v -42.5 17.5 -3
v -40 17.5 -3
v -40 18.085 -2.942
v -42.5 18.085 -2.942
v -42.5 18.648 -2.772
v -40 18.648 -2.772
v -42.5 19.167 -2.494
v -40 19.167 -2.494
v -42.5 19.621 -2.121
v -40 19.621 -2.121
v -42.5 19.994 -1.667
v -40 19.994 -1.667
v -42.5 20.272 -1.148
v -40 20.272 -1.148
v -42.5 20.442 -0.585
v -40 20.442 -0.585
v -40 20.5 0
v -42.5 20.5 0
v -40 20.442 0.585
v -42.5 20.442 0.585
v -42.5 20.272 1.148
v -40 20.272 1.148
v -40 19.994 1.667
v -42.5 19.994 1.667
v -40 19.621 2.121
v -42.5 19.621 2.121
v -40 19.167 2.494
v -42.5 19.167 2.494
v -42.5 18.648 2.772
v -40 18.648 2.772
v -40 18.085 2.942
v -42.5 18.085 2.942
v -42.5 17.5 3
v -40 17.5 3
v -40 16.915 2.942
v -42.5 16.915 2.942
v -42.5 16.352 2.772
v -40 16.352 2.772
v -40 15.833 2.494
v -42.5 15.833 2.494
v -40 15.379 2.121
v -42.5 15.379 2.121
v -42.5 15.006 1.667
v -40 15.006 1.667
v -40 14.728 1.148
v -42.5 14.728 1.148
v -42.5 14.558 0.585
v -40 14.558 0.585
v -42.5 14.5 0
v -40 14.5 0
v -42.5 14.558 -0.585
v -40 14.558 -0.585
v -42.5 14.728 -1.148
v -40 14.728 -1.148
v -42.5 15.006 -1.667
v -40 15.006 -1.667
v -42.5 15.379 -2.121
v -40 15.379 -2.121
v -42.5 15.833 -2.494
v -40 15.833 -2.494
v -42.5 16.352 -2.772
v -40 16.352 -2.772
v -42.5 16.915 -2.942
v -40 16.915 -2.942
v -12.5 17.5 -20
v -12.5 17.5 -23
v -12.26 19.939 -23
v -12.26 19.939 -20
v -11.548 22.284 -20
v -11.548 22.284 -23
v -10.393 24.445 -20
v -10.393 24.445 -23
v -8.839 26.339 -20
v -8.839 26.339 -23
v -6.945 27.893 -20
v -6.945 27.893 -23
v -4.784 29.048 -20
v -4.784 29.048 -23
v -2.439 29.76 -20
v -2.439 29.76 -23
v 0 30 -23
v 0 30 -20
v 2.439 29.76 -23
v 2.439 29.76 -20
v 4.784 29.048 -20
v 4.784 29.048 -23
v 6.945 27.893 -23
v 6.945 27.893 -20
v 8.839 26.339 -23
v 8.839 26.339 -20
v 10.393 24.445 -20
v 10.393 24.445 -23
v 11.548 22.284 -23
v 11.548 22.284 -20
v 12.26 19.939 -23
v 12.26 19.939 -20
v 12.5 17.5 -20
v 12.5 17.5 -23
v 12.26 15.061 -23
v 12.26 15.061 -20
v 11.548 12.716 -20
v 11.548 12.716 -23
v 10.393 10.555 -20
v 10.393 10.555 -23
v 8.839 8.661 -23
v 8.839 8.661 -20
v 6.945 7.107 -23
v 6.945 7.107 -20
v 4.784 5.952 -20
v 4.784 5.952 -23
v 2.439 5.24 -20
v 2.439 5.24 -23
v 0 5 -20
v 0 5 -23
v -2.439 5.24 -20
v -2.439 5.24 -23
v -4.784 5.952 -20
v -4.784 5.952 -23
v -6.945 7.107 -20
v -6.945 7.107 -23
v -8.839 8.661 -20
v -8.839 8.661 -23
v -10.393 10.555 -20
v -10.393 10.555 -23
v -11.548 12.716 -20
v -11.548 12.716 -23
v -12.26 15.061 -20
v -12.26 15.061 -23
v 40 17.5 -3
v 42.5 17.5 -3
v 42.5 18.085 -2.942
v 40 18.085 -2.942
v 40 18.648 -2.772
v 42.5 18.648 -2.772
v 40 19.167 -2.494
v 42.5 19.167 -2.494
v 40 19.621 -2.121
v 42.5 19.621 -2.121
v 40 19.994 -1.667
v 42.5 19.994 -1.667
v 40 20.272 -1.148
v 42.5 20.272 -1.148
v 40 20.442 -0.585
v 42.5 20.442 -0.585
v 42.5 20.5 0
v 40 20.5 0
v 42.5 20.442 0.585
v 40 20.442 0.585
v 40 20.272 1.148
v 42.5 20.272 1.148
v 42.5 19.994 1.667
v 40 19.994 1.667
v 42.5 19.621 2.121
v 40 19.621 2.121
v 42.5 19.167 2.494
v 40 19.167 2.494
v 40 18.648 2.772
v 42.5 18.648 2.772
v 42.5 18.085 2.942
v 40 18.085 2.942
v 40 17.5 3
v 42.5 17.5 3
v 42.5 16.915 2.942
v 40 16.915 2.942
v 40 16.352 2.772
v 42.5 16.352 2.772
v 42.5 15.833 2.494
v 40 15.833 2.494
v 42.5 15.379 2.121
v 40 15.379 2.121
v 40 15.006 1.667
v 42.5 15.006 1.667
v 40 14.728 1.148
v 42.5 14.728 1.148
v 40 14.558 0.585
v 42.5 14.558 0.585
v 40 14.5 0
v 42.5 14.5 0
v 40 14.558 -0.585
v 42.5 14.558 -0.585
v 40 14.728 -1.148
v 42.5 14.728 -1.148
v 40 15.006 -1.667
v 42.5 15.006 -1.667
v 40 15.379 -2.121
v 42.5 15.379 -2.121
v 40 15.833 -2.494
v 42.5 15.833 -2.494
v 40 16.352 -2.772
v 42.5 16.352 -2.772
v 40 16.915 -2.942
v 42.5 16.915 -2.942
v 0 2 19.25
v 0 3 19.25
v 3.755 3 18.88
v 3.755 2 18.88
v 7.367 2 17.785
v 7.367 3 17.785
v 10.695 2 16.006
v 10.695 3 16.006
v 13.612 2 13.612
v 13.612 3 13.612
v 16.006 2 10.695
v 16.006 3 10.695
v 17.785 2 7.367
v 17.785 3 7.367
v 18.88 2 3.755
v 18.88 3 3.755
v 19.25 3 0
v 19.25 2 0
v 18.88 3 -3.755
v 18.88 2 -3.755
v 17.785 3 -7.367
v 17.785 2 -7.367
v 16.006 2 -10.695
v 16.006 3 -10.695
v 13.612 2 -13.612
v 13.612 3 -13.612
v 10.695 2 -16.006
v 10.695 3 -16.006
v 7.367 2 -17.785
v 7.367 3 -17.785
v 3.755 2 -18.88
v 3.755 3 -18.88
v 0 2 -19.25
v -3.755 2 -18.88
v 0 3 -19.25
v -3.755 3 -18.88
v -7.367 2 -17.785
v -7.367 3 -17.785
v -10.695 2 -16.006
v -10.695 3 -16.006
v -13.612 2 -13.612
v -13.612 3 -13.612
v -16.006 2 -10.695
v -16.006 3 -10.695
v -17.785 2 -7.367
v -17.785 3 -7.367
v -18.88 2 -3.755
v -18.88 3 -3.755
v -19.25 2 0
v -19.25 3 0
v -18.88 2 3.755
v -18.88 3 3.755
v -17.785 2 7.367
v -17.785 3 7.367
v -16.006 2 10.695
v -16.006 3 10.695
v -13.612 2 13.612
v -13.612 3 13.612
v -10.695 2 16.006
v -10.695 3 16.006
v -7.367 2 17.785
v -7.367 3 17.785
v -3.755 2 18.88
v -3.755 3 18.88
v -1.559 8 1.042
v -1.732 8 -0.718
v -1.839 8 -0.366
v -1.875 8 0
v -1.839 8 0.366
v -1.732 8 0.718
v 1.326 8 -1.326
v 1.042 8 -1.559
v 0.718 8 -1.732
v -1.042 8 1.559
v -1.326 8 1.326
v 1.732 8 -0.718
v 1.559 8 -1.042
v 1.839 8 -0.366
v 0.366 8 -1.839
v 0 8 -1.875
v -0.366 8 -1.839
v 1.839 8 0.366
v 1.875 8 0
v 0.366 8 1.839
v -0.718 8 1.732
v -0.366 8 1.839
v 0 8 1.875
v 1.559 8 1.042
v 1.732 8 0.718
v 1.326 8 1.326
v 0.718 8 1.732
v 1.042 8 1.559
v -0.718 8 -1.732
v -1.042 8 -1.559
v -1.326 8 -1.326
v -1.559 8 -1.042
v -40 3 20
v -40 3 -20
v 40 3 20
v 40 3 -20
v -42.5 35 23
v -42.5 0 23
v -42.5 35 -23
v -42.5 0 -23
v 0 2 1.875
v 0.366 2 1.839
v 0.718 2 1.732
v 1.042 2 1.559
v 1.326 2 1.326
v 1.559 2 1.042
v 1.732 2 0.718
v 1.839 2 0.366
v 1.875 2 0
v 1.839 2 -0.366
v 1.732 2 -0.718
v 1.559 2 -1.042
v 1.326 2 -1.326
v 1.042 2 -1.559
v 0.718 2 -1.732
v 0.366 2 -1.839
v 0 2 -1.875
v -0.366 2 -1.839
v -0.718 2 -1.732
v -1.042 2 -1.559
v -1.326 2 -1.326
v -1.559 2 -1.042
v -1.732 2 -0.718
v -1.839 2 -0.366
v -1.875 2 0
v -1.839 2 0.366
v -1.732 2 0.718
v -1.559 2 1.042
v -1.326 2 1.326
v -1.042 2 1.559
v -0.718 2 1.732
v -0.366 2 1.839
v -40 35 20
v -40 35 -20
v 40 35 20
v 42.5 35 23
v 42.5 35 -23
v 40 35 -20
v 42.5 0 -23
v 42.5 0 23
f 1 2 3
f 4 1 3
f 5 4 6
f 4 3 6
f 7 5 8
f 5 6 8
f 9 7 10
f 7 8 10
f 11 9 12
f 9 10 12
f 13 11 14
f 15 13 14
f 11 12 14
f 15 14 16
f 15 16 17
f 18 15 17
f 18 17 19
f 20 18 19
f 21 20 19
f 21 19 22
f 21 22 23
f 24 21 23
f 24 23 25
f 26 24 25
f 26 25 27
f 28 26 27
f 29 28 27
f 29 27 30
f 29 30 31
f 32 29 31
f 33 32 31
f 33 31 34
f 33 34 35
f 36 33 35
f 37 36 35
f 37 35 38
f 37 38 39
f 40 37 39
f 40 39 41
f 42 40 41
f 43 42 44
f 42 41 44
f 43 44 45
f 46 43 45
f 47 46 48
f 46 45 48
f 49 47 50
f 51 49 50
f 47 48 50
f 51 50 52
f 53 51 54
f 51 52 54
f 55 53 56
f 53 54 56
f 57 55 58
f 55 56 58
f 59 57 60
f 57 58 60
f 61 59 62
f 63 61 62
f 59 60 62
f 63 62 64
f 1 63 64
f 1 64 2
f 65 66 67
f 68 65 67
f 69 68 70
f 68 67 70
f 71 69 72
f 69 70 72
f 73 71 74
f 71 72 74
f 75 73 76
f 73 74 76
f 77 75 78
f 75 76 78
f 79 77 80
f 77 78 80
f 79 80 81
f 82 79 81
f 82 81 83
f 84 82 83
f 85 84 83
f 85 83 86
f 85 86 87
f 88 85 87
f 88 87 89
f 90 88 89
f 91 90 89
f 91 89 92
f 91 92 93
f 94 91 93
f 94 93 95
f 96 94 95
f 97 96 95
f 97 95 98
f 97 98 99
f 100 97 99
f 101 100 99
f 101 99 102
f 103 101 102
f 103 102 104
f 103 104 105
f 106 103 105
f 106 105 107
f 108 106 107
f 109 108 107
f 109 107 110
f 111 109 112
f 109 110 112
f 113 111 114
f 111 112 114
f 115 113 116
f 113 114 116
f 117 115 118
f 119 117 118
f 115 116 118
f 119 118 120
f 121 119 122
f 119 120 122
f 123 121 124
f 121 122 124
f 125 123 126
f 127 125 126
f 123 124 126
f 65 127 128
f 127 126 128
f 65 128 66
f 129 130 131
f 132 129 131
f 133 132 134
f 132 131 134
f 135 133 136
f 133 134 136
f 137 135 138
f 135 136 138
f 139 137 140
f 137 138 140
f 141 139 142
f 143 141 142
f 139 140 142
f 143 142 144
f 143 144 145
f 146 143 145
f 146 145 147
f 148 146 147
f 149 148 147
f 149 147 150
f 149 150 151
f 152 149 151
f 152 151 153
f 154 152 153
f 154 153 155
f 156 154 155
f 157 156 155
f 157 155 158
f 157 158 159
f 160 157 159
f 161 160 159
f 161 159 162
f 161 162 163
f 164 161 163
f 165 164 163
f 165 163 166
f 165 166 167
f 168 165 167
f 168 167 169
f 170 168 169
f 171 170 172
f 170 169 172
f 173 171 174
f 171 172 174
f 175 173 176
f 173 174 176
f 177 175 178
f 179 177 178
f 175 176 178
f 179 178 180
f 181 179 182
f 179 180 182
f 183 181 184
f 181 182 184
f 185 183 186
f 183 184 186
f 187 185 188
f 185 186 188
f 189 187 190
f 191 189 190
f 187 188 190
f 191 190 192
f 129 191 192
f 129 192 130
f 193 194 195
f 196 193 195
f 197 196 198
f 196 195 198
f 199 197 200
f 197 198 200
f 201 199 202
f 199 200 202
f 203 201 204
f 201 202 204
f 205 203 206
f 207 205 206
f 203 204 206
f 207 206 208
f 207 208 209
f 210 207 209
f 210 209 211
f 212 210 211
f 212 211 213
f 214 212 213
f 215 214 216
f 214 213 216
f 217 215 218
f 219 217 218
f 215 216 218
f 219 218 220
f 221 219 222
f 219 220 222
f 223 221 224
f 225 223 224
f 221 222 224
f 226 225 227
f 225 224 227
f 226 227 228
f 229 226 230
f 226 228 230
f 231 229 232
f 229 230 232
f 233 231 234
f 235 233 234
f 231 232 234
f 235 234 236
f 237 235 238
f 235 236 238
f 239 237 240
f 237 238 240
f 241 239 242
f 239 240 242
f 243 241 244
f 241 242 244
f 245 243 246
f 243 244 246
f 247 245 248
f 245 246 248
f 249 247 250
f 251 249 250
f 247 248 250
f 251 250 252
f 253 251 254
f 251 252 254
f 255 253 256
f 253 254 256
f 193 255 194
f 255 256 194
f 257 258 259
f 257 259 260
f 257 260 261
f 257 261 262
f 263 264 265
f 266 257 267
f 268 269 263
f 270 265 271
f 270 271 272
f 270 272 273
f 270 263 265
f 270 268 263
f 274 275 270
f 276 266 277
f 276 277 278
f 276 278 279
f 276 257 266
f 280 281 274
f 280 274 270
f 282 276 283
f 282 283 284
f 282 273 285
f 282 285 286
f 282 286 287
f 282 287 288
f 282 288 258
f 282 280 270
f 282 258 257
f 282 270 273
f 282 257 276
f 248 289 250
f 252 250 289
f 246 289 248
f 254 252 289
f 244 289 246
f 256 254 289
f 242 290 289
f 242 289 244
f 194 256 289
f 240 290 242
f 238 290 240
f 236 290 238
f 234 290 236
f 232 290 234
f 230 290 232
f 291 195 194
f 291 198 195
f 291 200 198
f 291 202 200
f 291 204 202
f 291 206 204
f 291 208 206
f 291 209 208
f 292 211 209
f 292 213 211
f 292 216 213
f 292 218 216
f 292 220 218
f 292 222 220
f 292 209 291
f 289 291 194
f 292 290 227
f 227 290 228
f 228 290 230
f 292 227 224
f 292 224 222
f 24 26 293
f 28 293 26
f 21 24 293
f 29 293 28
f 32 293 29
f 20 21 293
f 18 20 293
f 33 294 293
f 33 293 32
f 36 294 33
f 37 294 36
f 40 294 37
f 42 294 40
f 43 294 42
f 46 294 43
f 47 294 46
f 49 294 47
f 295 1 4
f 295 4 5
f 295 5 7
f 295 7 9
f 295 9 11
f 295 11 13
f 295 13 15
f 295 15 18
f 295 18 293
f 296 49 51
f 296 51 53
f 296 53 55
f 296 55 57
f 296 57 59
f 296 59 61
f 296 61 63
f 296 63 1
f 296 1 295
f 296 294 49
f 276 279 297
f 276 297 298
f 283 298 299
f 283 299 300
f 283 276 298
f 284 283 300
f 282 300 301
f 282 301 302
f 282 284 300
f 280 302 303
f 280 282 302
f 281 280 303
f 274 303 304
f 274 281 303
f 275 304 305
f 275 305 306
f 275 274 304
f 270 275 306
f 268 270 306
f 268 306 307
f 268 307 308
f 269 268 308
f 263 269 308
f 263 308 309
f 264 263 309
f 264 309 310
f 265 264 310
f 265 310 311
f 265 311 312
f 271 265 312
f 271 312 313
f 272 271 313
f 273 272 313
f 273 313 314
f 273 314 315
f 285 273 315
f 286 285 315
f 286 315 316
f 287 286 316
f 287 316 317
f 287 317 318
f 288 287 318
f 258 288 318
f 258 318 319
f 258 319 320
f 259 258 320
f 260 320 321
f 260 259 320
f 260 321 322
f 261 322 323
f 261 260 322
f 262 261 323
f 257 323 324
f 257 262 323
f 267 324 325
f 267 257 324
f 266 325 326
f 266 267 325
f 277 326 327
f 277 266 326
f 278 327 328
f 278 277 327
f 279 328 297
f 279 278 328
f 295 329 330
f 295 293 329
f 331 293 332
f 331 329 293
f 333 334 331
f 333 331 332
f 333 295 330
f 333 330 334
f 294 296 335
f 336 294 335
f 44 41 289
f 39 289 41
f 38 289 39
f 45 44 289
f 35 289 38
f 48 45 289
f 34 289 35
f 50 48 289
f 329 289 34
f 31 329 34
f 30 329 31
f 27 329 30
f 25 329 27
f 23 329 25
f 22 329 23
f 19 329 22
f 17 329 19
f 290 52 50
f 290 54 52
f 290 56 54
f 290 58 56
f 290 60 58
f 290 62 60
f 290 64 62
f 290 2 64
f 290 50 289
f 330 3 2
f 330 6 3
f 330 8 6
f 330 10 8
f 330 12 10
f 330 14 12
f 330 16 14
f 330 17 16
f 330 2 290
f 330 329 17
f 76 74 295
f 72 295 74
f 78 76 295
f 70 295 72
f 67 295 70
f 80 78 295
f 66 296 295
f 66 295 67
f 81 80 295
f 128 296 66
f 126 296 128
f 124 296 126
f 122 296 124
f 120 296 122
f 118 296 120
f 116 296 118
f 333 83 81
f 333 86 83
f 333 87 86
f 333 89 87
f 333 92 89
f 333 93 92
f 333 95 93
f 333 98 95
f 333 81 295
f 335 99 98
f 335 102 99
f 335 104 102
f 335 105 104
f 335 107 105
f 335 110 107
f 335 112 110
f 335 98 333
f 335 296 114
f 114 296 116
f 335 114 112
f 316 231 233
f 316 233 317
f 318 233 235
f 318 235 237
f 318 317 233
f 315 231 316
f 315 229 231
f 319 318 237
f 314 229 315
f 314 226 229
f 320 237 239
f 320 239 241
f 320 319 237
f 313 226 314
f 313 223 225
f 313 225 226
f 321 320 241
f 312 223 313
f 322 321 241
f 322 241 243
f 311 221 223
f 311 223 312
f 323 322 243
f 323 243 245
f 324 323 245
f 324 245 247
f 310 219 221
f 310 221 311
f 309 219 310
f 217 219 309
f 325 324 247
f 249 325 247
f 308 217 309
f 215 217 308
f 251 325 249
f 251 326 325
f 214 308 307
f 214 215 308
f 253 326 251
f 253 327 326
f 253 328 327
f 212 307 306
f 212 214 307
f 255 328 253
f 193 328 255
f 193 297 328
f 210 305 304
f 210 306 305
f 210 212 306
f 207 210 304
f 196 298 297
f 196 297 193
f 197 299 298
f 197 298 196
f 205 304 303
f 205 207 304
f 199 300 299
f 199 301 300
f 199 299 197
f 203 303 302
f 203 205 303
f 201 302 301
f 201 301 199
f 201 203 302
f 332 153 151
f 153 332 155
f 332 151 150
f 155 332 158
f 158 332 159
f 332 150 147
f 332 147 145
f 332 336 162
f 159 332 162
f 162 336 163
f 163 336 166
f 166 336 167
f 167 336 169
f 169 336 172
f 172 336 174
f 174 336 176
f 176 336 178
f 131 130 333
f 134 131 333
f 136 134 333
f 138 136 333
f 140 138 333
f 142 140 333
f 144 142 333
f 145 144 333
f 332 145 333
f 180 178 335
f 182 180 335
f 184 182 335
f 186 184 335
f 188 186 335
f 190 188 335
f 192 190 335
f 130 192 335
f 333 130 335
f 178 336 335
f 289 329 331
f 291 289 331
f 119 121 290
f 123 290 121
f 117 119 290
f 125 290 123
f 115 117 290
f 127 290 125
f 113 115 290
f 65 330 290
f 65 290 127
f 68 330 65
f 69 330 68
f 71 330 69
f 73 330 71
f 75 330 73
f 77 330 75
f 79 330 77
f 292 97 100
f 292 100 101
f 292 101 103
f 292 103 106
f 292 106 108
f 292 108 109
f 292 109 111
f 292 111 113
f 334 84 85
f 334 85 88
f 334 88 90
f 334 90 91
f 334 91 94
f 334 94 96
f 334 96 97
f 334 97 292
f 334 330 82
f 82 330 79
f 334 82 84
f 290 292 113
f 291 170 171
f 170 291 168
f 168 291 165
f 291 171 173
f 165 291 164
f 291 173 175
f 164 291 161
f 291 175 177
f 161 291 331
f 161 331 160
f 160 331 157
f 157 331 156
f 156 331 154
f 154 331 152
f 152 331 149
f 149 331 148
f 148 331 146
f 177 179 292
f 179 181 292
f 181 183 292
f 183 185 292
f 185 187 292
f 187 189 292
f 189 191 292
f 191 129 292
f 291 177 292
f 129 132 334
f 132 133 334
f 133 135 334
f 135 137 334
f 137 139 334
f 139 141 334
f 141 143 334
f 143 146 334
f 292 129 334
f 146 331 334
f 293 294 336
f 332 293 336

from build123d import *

# Parameters (mm, degrees)
SKETCH1_W           = 85
SKETCH1_H           = 46
BOSS_EXTRUDE1_DEPTH = 35
SKETCH3_R           = 12.5
CUT_EXTRUDE2_DEPTH  = 10
SKETCH4_R           = 3
CUT_EXTRUDE3_DEPTH  = 95.757585448
SKETCH2_W           = 80
SKETCH2_H           = 40
CUT_EXTRUDE4_DEPTH  = 60.667830529
SKETCH5_W           = 80
SKETCH5_H           = 40
BOSS_EXTRUDE2_DEPTH = 3
SKETCH6_R           = 19.25
SKETCH6_R_2         = 1.875
CUT_EXTRUDE6_DEPTH  = 1
BOSS_EXTRUDE3_START = 5
SKETCH7_R           = 1.875
BOSS_EXTRUDE3_DEPTH = 5


with BuildPart() as part:
    # Sketch1 → Boss-Extrude1 (new body)
    with BuildSketch(Plane(origin=(0, 0, 0), x_dir=(1, 0, 0), z_dir=(0, 1, 0))):
        Rectangle(SKETCH1_W, SKETCH1_H)
    extrude(amount=BOSS_EXTRUDE1_DEPTH)

    # Sketch3 → Cut-Extrude2 (cut)
    with BuildSketch(Plane(origin=(0, 0, -23), x_dir=(-1, 0, 0), z_dir=(0, 0, -1))):
        with Locations((0, 17.5)):
            Circle(SKETCH3_R)
    extrude(amount=-CUT_EXTRUDE2_DEPTH, mode=Mode.SUBTRACT)

    # Sketch4 → Cut-Extrude3 (cut, through all)
    with BuildSketch(Plane(origin=(42.5, 0, 0), x_dir=(0, 0, -1), z_dir=(1, 0, 0))):
        with Locations((0, 17.5)):
            Circle(SKETCH4_R)
    extrude(amount=-CUT_EXTRUDE3_DEPTH, mode=Mode.SUBTRACT)

    # Sketch2 → Cut-Extrude4 (cut, through all)
    with BuildSketch(Plane(origin=(0, 35, 0), x_dir=(1, 0, 0), z_dir=(0, 1, 0))):
        Rectangle(SKETCH2_W, SKETCH2_H)
    extrude(amount=-CUT_EXTRUDE4_DEPTH, mode=Mode.SUBTRACT)

    # Sketch5 → Boss-Extrude2 (add)
    with BuildSketch(Plane(origin=(0, 0, 0), x_dir=(1, 0, 0), z_dir=(0, 1, 0))):
        Rectangle(SKETCH5_W, SKETCH5_H)
    extrude(amount=BOSS_EXTRUDE2_DEPTH)

    # Sketch6 → Cut-Extrude6 (cut)
    with BuildSketch(Plane(origin=(0, 3, 0), x_dir=(1, 0, 0), z_dir=(0, 1, 0))):
        with Locations(Location((0, 0, 0), (0, 0, 270))):
            Circle(SKETCH6_R)
        with Locations(Location((0, 0, 0), (0, 0, 270))):
            Circle(SKETCH6_R_2, mode=Mode.SUBTRACT)
    extrude(amount=-CUT_EXTRUDE6_DEPTH, mode=Mode.SUBTRACT)

    # Sketch7 → Boss-Extrude3 (add)
    with BuildSketch(Plane(origin=(0, 3, 0), x_dir=(1, 0, 0), z_dir=(0, 1, 0)).offset(BOSS_EXTRUDE3_START)):
        with Locations(Location((0, 0, 0), (0, 0, 270))):
            Circle(SKETCH7_R)
    extrude(amount=-BOSS_EXTRUDE3_DEPTH)


solid = part.part
